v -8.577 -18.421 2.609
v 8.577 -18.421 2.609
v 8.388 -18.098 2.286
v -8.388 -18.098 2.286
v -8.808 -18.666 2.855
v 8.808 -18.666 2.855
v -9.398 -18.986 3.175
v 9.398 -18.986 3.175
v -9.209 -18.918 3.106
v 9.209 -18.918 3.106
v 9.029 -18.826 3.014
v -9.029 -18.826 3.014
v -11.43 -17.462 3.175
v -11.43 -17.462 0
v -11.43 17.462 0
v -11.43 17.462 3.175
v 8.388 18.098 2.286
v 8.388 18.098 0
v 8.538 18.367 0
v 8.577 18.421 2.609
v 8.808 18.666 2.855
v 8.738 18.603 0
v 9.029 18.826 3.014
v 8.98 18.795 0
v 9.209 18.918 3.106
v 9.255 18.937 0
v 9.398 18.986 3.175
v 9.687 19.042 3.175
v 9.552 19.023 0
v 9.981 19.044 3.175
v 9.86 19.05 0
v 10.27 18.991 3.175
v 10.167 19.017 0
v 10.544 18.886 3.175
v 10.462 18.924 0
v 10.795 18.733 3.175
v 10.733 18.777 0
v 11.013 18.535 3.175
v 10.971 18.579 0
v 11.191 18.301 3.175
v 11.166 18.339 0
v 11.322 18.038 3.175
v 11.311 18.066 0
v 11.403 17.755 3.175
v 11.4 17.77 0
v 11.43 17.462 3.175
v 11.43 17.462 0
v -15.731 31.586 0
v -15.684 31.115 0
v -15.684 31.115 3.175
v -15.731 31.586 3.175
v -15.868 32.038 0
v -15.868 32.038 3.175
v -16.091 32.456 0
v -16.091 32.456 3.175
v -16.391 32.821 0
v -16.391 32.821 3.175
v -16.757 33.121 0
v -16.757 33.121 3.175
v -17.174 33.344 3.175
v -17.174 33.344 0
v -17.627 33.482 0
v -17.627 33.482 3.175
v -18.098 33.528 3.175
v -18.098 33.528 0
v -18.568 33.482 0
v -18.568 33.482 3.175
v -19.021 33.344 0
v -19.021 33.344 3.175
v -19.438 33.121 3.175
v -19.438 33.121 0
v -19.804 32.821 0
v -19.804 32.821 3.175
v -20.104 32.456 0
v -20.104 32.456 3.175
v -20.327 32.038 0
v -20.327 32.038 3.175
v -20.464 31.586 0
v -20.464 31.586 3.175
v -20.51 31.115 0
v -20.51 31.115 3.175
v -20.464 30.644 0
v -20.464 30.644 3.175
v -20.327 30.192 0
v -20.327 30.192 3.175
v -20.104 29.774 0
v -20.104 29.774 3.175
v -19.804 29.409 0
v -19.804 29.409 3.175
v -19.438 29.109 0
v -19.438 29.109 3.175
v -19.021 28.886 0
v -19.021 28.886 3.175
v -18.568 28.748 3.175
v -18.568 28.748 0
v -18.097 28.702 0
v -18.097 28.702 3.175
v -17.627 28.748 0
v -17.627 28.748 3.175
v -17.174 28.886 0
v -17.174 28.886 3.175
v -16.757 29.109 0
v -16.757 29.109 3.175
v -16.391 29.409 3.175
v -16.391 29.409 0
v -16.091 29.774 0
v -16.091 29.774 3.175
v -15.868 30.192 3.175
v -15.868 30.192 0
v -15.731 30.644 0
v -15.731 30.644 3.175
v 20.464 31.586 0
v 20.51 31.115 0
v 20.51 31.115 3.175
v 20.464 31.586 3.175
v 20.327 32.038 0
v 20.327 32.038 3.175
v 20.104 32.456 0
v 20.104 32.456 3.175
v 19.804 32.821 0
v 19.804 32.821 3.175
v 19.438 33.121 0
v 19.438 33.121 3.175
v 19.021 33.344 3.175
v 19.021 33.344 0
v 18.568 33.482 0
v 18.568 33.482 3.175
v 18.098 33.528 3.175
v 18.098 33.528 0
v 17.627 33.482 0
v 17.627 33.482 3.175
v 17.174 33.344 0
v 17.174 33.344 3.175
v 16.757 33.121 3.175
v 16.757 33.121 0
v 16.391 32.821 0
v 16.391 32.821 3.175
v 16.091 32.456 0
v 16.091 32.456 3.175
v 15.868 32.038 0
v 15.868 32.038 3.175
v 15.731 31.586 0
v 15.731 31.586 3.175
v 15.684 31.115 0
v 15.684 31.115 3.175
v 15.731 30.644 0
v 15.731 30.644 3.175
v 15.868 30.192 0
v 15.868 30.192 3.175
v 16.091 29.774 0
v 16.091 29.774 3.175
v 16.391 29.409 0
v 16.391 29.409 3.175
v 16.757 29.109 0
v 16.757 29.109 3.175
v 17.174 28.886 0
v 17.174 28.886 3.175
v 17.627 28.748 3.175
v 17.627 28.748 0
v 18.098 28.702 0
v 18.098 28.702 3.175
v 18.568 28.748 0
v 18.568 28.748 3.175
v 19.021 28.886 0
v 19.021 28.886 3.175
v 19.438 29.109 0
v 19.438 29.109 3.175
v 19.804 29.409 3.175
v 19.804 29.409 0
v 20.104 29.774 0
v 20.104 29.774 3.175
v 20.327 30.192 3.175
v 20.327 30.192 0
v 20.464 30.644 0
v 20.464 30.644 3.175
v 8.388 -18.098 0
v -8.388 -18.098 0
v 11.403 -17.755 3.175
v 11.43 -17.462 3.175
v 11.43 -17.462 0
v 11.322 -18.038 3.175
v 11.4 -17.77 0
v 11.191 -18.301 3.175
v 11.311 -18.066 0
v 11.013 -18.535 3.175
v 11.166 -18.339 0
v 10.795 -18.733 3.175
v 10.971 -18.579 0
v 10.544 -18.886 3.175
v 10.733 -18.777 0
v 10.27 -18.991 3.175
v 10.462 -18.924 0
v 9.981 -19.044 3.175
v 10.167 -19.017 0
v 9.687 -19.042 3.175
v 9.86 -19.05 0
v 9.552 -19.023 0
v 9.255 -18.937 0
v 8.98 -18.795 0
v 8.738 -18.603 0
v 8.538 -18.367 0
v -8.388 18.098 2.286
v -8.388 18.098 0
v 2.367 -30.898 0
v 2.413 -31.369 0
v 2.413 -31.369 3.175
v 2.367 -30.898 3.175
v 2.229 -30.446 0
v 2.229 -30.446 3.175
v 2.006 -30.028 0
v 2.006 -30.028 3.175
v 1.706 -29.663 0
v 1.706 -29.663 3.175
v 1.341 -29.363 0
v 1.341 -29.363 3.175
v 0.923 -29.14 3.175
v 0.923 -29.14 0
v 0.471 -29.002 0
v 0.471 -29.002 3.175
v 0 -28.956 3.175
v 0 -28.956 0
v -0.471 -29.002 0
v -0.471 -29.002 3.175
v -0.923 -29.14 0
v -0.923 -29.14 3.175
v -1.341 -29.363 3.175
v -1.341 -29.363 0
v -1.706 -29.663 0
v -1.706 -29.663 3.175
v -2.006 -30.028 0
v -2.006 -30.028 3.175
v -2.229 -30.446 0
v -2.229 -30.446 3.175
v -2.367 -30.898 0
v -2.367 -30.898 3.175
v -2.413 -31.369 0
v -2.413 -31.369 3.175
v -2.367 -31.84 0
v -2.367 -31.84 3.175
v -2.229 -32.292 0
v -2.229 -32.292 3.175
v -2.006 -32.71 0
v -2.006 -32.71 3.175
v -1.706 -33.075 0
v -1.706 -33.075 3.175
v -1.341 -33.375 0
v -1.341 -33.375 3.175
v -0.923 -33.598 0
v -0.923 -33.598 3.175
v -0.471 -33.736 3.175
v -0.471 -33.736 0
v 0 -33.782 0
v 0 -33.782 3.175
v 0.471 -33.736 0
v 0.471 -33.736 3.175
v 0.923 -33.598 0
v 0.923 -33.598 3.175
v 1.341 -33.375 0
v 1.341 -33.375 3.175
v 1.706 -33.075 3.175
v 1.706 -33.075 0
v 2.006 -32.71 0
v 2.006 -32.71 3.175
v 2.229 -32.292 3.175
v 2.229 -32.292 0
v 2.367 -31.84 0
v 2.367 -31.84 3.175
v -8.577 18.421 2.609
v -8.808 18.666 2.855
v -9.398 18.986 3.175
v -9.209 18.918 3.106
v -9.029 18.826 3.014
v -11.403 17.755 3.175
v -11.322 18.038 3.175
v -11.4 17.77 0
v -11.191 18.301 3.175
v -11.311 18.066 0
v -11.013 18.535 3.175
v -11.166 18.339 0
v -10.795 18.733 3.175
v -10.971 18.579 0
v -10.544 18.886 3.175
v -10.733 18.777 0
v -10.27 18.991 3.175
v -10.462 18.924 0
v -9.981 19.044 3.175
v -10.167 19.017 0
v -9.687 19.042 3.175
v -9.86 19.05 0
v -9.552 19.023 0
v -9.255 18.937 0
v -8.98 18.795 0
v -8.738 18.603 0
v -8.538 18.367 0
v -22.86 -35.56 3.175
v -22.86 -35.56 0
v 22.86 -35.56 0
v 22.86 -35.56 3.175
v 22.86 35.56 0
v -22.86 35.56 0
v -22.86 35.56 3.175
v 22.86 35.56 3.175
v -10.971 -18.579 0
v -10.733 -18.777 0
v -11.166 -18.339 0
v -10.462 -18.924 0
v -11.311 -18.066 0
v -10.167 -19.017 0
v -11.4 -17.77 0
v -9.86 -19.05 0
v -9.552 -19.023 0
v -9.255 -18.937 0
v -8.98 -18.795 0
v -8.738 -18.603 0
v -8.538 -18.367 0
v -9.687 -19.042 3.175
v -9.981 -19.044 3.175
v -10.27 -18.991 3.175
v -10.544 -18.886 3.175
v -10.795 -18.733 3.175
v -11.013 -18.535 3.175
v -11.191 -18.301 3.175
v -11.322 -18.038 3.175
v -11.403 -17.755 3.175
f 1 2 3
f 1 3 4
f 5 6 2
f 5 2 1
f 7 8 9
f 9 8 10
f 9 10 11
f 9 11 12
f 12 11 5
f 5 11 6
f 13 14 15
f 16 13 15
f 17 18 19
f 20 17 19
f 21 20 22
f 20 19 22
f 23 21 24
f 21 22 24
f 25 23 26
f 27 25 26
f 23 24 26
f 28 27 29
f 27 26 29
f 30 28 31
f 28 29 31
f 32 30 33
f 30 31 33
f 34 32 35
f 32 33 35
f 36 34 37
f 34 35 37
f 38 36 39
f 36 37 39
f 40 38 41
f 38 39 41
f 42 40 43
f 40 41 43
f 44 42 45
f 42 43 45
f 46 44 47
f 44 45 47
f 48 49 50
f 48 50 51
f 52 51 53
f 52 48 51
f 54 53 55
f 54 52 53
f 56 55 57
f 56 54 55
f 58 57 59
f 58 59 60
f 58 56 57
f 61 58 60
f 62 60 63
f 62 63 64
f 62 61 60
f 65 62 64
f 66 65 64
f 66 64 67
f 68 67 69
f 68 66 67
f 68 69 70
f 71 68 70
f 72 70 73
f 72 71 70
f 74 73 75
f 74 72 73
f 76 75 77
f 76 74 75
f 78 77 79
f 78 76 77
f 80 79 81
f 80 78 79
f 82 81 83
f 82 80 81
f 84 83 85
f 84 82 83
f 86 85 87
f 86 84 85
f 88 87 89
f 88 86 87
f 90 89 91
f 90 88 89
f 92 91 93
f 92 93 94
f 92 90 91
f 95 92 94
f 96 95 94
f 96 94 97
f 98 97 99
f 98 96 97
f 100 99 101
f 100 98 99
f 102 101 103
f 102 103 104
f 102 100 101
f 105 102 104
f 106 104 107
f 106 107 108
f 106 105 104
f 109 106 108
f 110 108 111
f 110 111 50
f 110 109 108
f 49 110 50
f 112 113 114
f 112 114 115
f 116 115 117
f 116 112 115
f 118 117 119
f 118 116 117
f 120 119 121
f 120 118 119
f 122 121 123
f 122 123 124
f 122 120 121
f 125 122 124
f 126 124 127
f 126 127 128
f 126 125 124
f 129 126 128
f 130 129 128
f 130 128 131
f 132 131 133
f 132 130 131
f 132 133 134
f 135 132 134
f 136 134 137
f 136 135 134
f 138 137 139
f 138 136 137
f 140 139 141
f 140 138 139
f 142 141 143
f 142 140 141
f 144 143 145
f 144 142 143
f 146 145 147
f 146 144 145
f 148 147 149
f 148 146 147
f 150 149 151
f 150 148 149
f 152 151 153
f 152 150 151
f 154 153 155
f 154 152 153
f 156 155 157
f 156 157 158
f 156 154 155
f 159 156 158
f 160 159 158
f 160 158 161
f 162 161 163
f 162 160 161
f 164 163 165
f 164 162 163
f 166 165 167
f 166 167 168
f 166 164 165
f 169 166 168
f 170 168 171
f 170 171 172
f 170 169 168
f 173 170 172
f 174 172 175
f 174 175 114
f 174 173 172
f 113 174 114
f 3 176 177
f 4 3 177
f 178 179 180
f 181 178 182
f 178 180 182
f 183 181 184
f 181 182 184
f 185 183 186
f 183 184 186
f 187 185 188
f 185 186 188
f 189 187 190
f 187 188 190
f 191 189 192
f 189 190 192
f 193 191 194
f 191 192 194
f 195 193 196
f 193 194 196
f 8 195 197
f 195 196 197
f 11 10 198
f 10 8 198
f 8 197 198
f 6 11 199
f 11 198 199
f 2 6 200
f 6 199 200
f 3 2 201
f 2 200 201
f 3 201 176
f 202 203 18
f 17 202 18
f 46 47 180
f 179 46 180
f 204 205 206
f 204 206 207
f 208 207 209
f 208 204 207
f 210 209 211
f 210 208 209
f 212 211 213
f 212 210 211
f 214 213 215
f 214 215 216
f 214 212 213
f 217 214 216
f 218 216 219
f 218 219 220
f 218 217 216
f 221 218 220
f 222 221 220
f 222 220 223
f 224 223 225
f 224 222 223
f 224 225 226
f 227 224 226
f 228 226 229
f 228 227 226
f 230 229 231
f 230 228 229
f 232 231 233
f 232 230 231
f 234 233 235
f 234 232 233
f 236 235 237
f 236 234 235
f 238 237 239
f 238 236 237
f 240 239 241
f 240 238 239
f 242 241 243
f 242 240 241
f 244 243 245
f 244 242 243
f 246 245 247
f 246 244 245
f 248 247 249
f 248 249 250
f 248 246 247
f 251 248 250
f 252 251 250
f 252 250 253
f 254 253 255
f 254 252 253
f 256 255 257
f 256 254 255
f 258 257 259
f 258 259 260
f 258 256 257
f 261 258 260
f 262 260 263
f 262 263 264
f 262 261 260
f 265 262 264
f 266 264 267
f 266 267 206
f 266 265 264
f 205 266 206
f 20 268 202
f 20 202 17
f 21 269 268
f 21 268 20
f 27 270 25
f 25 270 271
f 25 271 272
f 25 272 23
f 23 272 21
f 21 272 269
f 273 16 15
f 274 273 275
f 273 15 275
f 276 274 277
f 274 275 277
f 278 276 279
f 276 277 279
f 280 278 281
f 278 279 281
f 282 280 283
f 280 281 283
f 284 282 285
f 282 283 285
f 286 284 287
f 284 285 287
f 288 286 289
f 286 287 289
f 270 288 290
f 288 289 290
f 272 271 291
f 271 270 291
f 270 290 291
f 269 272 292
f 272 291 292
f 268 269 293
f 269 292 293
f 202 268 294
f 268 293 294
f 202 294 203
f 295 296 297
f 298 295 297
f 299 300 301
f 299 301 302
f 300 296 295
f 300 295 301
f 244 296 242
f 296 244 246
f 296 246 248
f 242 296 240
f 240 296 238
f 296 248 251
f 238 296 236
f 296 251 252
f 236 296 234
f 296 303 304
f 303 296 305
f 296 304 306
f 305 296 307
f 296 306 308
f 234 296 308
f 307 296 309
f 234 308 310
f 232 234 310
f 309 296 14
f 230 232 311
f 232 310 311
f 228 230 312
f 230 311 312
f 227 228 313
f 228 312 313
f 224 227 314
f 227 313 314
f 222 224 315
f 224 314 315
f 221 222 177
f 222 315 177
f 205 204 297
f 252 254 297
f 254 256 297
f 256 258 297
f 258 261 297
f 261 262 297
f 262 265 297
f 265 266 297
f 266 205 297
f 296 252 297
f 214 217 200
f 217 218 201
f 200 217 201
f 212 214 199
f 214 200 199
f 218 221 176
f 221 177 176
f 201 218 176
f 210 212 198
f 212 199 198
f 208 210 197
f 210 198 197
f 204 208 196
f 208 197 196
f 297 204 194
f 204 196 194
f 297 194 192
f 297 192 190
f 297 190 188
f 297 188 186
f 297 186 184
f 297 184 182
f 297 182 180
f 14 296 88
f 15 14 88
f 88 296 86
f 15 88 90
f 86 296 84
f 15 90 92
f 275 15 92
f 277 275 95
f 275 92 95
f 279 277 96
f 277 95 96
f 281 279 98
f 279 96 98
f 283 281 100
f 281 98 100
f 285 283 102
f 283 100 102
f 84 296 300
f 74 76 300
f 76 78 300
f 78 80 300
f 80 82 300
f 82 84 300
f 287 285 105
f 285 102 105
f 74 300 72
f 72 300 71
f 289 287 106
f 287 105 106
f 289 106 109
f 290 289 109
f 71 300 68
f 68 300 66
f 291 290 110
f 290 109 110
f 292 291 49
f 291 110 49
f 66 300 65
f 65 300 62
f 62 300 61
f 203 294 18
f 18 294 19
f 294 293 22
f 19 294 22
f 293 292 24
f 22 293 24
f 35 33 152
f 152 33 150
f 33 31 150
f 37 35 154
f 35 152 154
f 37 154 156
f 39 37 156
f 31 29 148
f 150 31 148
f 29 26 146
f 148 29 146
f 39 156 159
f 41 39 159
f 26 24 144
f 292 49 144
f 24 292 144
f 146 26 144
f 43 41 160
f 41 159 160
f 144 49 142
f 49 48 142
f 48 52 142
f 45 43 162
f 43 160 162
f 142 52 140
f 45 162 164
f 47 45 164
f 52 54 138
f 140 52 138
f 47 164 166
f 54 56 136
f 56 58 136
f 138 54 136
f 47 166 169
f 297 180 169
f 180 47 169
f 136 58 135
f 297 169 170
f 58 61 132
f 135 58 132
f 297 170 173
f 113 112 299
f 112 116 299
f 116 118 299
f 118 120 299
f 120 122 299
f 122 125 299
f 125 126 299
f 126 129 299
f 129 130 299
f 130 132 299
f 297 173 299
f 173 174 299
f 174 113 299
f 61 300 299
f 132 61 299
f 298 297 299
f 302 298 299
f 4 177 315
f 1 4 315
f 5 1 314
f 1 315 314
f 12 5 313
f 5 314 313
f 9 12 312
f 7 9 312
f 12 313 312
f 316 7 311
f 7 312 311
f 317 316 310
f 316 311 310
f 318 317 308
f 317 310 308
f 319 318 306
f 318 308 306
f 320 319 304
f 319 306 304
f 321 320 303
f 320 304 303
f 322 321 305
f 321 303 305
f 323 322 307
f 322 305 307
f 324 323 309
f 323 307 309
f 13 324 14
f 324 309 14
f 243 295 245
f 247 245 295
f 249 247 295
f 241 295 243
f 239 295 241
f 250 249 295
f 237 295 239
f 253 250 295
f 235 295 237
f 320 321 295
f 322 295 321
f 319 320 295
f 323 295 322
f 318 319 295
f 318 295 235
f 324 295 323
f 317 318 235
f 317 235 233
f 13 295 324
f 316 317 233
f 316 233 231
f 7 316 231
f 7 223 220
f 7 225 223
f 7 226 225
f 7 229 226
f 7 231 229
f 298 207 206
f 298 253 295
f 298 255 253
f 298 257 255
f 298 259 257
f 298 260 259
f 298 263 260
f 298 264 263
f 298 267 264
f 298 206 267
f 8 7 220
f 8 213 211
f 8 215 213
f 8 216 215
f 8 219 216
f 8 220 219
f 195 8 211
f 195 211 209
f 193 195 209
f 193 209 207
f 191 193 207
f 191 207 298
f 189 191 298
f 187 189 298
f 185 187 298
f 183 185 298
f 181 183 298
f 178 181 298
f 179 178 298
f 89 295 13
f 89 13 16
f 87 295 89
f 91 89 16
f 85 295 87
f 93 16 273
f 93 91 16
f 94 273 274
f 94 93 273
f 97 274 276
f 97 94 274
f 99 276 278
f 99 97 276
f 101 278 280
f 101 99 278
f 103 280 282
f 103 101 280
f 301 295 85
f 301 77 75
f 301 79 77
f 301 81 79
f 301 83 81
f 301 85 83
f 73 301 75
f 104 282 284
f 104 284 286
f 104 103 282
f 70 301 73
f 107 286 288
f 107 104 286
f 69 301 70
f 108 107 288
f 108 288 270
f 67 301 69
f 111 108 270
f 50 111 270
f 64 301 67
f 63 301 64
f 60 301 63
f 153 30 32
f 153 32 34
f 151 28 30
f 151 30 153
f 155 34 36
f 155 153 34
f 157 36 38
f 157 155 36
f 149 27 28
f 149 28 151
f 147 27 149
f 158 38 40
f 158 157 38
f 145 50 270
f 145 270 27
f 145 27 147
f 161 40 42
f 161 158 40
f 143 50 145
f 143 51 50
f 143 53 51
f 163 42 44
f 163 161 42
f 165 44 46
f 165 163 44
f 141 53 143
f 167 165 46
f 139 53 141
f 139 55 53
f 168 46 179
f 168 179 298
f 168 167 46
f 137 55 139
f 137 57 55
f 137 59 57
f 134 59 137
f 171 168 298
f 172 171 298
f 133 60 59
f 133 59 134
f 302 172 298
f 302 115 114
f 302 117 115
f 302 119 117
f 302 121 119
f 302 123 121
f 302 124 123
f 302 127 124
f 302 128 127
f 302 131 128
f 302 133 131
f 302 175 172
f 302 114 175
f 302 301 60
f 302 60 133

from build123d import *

# Parameters (mm, degrees)
F0_W     = 45.72
F0_H     = 71.12
F0_R     = 2.413
F1_DEPTH = 3.175
F2_SIZE  = 0.889


with BuildPart() as f1:
    # F0 (on Top) → F1 (new body)
    with BuildSketch(Plane.XY):
        Rectangle(F0_W, F0_H)
        with Locations((0, -31.369)):
            Circle(F0_R, mode=Mode.SUBTRACT)
        with BuildLine():
            ThreePointArc((11.43, -17.4625), (10.166842, -19.016514), (8.387532, -18.0975))
            Line((8.387532, -18.0975), (-8.387532, -18.0975))
            ThreePointArc((-8.387532, -18.0975), (-10.166842, -19.016514), (-11.43, -17.4625))
            Line((-11.43, -17.4625), (-11.43, 17.4625))
            ThreePointArc((-11.43, 17.4625), (-10.166842, 19.016514), (-8.387532, 18.0975))
            Line((-8.387532, 18.0975), (8.387532, 18.0975))
            ThreePointArc((8.387532, 18.0975), (10.166842, 19.016514), (11.43, 17.4625))
            Line((11.43, 17.4625), (11.43, -17.4625))
        make_face(mode=Mode.SUBTRACT)
        with Locations((-18.0975, 31.115)):
            Circle(F0_R, mode=Mode.SUBTRACT)
        with Locations((18.0975, 31.115)):
            Circle(F0_R, mode=Mode.SUBTRACT)
    extrude(amount=F1_DEPTH)

    # F2
    f2_edges = [f1.edges().sort_by_distance(p)[0] for p in [
        (0, 18.0975, 3.175),
        (0, -18.0975, 3.175),
    ]]
    chamfer(f2_edges, length=F2_SIZE)


solid = f1.part
